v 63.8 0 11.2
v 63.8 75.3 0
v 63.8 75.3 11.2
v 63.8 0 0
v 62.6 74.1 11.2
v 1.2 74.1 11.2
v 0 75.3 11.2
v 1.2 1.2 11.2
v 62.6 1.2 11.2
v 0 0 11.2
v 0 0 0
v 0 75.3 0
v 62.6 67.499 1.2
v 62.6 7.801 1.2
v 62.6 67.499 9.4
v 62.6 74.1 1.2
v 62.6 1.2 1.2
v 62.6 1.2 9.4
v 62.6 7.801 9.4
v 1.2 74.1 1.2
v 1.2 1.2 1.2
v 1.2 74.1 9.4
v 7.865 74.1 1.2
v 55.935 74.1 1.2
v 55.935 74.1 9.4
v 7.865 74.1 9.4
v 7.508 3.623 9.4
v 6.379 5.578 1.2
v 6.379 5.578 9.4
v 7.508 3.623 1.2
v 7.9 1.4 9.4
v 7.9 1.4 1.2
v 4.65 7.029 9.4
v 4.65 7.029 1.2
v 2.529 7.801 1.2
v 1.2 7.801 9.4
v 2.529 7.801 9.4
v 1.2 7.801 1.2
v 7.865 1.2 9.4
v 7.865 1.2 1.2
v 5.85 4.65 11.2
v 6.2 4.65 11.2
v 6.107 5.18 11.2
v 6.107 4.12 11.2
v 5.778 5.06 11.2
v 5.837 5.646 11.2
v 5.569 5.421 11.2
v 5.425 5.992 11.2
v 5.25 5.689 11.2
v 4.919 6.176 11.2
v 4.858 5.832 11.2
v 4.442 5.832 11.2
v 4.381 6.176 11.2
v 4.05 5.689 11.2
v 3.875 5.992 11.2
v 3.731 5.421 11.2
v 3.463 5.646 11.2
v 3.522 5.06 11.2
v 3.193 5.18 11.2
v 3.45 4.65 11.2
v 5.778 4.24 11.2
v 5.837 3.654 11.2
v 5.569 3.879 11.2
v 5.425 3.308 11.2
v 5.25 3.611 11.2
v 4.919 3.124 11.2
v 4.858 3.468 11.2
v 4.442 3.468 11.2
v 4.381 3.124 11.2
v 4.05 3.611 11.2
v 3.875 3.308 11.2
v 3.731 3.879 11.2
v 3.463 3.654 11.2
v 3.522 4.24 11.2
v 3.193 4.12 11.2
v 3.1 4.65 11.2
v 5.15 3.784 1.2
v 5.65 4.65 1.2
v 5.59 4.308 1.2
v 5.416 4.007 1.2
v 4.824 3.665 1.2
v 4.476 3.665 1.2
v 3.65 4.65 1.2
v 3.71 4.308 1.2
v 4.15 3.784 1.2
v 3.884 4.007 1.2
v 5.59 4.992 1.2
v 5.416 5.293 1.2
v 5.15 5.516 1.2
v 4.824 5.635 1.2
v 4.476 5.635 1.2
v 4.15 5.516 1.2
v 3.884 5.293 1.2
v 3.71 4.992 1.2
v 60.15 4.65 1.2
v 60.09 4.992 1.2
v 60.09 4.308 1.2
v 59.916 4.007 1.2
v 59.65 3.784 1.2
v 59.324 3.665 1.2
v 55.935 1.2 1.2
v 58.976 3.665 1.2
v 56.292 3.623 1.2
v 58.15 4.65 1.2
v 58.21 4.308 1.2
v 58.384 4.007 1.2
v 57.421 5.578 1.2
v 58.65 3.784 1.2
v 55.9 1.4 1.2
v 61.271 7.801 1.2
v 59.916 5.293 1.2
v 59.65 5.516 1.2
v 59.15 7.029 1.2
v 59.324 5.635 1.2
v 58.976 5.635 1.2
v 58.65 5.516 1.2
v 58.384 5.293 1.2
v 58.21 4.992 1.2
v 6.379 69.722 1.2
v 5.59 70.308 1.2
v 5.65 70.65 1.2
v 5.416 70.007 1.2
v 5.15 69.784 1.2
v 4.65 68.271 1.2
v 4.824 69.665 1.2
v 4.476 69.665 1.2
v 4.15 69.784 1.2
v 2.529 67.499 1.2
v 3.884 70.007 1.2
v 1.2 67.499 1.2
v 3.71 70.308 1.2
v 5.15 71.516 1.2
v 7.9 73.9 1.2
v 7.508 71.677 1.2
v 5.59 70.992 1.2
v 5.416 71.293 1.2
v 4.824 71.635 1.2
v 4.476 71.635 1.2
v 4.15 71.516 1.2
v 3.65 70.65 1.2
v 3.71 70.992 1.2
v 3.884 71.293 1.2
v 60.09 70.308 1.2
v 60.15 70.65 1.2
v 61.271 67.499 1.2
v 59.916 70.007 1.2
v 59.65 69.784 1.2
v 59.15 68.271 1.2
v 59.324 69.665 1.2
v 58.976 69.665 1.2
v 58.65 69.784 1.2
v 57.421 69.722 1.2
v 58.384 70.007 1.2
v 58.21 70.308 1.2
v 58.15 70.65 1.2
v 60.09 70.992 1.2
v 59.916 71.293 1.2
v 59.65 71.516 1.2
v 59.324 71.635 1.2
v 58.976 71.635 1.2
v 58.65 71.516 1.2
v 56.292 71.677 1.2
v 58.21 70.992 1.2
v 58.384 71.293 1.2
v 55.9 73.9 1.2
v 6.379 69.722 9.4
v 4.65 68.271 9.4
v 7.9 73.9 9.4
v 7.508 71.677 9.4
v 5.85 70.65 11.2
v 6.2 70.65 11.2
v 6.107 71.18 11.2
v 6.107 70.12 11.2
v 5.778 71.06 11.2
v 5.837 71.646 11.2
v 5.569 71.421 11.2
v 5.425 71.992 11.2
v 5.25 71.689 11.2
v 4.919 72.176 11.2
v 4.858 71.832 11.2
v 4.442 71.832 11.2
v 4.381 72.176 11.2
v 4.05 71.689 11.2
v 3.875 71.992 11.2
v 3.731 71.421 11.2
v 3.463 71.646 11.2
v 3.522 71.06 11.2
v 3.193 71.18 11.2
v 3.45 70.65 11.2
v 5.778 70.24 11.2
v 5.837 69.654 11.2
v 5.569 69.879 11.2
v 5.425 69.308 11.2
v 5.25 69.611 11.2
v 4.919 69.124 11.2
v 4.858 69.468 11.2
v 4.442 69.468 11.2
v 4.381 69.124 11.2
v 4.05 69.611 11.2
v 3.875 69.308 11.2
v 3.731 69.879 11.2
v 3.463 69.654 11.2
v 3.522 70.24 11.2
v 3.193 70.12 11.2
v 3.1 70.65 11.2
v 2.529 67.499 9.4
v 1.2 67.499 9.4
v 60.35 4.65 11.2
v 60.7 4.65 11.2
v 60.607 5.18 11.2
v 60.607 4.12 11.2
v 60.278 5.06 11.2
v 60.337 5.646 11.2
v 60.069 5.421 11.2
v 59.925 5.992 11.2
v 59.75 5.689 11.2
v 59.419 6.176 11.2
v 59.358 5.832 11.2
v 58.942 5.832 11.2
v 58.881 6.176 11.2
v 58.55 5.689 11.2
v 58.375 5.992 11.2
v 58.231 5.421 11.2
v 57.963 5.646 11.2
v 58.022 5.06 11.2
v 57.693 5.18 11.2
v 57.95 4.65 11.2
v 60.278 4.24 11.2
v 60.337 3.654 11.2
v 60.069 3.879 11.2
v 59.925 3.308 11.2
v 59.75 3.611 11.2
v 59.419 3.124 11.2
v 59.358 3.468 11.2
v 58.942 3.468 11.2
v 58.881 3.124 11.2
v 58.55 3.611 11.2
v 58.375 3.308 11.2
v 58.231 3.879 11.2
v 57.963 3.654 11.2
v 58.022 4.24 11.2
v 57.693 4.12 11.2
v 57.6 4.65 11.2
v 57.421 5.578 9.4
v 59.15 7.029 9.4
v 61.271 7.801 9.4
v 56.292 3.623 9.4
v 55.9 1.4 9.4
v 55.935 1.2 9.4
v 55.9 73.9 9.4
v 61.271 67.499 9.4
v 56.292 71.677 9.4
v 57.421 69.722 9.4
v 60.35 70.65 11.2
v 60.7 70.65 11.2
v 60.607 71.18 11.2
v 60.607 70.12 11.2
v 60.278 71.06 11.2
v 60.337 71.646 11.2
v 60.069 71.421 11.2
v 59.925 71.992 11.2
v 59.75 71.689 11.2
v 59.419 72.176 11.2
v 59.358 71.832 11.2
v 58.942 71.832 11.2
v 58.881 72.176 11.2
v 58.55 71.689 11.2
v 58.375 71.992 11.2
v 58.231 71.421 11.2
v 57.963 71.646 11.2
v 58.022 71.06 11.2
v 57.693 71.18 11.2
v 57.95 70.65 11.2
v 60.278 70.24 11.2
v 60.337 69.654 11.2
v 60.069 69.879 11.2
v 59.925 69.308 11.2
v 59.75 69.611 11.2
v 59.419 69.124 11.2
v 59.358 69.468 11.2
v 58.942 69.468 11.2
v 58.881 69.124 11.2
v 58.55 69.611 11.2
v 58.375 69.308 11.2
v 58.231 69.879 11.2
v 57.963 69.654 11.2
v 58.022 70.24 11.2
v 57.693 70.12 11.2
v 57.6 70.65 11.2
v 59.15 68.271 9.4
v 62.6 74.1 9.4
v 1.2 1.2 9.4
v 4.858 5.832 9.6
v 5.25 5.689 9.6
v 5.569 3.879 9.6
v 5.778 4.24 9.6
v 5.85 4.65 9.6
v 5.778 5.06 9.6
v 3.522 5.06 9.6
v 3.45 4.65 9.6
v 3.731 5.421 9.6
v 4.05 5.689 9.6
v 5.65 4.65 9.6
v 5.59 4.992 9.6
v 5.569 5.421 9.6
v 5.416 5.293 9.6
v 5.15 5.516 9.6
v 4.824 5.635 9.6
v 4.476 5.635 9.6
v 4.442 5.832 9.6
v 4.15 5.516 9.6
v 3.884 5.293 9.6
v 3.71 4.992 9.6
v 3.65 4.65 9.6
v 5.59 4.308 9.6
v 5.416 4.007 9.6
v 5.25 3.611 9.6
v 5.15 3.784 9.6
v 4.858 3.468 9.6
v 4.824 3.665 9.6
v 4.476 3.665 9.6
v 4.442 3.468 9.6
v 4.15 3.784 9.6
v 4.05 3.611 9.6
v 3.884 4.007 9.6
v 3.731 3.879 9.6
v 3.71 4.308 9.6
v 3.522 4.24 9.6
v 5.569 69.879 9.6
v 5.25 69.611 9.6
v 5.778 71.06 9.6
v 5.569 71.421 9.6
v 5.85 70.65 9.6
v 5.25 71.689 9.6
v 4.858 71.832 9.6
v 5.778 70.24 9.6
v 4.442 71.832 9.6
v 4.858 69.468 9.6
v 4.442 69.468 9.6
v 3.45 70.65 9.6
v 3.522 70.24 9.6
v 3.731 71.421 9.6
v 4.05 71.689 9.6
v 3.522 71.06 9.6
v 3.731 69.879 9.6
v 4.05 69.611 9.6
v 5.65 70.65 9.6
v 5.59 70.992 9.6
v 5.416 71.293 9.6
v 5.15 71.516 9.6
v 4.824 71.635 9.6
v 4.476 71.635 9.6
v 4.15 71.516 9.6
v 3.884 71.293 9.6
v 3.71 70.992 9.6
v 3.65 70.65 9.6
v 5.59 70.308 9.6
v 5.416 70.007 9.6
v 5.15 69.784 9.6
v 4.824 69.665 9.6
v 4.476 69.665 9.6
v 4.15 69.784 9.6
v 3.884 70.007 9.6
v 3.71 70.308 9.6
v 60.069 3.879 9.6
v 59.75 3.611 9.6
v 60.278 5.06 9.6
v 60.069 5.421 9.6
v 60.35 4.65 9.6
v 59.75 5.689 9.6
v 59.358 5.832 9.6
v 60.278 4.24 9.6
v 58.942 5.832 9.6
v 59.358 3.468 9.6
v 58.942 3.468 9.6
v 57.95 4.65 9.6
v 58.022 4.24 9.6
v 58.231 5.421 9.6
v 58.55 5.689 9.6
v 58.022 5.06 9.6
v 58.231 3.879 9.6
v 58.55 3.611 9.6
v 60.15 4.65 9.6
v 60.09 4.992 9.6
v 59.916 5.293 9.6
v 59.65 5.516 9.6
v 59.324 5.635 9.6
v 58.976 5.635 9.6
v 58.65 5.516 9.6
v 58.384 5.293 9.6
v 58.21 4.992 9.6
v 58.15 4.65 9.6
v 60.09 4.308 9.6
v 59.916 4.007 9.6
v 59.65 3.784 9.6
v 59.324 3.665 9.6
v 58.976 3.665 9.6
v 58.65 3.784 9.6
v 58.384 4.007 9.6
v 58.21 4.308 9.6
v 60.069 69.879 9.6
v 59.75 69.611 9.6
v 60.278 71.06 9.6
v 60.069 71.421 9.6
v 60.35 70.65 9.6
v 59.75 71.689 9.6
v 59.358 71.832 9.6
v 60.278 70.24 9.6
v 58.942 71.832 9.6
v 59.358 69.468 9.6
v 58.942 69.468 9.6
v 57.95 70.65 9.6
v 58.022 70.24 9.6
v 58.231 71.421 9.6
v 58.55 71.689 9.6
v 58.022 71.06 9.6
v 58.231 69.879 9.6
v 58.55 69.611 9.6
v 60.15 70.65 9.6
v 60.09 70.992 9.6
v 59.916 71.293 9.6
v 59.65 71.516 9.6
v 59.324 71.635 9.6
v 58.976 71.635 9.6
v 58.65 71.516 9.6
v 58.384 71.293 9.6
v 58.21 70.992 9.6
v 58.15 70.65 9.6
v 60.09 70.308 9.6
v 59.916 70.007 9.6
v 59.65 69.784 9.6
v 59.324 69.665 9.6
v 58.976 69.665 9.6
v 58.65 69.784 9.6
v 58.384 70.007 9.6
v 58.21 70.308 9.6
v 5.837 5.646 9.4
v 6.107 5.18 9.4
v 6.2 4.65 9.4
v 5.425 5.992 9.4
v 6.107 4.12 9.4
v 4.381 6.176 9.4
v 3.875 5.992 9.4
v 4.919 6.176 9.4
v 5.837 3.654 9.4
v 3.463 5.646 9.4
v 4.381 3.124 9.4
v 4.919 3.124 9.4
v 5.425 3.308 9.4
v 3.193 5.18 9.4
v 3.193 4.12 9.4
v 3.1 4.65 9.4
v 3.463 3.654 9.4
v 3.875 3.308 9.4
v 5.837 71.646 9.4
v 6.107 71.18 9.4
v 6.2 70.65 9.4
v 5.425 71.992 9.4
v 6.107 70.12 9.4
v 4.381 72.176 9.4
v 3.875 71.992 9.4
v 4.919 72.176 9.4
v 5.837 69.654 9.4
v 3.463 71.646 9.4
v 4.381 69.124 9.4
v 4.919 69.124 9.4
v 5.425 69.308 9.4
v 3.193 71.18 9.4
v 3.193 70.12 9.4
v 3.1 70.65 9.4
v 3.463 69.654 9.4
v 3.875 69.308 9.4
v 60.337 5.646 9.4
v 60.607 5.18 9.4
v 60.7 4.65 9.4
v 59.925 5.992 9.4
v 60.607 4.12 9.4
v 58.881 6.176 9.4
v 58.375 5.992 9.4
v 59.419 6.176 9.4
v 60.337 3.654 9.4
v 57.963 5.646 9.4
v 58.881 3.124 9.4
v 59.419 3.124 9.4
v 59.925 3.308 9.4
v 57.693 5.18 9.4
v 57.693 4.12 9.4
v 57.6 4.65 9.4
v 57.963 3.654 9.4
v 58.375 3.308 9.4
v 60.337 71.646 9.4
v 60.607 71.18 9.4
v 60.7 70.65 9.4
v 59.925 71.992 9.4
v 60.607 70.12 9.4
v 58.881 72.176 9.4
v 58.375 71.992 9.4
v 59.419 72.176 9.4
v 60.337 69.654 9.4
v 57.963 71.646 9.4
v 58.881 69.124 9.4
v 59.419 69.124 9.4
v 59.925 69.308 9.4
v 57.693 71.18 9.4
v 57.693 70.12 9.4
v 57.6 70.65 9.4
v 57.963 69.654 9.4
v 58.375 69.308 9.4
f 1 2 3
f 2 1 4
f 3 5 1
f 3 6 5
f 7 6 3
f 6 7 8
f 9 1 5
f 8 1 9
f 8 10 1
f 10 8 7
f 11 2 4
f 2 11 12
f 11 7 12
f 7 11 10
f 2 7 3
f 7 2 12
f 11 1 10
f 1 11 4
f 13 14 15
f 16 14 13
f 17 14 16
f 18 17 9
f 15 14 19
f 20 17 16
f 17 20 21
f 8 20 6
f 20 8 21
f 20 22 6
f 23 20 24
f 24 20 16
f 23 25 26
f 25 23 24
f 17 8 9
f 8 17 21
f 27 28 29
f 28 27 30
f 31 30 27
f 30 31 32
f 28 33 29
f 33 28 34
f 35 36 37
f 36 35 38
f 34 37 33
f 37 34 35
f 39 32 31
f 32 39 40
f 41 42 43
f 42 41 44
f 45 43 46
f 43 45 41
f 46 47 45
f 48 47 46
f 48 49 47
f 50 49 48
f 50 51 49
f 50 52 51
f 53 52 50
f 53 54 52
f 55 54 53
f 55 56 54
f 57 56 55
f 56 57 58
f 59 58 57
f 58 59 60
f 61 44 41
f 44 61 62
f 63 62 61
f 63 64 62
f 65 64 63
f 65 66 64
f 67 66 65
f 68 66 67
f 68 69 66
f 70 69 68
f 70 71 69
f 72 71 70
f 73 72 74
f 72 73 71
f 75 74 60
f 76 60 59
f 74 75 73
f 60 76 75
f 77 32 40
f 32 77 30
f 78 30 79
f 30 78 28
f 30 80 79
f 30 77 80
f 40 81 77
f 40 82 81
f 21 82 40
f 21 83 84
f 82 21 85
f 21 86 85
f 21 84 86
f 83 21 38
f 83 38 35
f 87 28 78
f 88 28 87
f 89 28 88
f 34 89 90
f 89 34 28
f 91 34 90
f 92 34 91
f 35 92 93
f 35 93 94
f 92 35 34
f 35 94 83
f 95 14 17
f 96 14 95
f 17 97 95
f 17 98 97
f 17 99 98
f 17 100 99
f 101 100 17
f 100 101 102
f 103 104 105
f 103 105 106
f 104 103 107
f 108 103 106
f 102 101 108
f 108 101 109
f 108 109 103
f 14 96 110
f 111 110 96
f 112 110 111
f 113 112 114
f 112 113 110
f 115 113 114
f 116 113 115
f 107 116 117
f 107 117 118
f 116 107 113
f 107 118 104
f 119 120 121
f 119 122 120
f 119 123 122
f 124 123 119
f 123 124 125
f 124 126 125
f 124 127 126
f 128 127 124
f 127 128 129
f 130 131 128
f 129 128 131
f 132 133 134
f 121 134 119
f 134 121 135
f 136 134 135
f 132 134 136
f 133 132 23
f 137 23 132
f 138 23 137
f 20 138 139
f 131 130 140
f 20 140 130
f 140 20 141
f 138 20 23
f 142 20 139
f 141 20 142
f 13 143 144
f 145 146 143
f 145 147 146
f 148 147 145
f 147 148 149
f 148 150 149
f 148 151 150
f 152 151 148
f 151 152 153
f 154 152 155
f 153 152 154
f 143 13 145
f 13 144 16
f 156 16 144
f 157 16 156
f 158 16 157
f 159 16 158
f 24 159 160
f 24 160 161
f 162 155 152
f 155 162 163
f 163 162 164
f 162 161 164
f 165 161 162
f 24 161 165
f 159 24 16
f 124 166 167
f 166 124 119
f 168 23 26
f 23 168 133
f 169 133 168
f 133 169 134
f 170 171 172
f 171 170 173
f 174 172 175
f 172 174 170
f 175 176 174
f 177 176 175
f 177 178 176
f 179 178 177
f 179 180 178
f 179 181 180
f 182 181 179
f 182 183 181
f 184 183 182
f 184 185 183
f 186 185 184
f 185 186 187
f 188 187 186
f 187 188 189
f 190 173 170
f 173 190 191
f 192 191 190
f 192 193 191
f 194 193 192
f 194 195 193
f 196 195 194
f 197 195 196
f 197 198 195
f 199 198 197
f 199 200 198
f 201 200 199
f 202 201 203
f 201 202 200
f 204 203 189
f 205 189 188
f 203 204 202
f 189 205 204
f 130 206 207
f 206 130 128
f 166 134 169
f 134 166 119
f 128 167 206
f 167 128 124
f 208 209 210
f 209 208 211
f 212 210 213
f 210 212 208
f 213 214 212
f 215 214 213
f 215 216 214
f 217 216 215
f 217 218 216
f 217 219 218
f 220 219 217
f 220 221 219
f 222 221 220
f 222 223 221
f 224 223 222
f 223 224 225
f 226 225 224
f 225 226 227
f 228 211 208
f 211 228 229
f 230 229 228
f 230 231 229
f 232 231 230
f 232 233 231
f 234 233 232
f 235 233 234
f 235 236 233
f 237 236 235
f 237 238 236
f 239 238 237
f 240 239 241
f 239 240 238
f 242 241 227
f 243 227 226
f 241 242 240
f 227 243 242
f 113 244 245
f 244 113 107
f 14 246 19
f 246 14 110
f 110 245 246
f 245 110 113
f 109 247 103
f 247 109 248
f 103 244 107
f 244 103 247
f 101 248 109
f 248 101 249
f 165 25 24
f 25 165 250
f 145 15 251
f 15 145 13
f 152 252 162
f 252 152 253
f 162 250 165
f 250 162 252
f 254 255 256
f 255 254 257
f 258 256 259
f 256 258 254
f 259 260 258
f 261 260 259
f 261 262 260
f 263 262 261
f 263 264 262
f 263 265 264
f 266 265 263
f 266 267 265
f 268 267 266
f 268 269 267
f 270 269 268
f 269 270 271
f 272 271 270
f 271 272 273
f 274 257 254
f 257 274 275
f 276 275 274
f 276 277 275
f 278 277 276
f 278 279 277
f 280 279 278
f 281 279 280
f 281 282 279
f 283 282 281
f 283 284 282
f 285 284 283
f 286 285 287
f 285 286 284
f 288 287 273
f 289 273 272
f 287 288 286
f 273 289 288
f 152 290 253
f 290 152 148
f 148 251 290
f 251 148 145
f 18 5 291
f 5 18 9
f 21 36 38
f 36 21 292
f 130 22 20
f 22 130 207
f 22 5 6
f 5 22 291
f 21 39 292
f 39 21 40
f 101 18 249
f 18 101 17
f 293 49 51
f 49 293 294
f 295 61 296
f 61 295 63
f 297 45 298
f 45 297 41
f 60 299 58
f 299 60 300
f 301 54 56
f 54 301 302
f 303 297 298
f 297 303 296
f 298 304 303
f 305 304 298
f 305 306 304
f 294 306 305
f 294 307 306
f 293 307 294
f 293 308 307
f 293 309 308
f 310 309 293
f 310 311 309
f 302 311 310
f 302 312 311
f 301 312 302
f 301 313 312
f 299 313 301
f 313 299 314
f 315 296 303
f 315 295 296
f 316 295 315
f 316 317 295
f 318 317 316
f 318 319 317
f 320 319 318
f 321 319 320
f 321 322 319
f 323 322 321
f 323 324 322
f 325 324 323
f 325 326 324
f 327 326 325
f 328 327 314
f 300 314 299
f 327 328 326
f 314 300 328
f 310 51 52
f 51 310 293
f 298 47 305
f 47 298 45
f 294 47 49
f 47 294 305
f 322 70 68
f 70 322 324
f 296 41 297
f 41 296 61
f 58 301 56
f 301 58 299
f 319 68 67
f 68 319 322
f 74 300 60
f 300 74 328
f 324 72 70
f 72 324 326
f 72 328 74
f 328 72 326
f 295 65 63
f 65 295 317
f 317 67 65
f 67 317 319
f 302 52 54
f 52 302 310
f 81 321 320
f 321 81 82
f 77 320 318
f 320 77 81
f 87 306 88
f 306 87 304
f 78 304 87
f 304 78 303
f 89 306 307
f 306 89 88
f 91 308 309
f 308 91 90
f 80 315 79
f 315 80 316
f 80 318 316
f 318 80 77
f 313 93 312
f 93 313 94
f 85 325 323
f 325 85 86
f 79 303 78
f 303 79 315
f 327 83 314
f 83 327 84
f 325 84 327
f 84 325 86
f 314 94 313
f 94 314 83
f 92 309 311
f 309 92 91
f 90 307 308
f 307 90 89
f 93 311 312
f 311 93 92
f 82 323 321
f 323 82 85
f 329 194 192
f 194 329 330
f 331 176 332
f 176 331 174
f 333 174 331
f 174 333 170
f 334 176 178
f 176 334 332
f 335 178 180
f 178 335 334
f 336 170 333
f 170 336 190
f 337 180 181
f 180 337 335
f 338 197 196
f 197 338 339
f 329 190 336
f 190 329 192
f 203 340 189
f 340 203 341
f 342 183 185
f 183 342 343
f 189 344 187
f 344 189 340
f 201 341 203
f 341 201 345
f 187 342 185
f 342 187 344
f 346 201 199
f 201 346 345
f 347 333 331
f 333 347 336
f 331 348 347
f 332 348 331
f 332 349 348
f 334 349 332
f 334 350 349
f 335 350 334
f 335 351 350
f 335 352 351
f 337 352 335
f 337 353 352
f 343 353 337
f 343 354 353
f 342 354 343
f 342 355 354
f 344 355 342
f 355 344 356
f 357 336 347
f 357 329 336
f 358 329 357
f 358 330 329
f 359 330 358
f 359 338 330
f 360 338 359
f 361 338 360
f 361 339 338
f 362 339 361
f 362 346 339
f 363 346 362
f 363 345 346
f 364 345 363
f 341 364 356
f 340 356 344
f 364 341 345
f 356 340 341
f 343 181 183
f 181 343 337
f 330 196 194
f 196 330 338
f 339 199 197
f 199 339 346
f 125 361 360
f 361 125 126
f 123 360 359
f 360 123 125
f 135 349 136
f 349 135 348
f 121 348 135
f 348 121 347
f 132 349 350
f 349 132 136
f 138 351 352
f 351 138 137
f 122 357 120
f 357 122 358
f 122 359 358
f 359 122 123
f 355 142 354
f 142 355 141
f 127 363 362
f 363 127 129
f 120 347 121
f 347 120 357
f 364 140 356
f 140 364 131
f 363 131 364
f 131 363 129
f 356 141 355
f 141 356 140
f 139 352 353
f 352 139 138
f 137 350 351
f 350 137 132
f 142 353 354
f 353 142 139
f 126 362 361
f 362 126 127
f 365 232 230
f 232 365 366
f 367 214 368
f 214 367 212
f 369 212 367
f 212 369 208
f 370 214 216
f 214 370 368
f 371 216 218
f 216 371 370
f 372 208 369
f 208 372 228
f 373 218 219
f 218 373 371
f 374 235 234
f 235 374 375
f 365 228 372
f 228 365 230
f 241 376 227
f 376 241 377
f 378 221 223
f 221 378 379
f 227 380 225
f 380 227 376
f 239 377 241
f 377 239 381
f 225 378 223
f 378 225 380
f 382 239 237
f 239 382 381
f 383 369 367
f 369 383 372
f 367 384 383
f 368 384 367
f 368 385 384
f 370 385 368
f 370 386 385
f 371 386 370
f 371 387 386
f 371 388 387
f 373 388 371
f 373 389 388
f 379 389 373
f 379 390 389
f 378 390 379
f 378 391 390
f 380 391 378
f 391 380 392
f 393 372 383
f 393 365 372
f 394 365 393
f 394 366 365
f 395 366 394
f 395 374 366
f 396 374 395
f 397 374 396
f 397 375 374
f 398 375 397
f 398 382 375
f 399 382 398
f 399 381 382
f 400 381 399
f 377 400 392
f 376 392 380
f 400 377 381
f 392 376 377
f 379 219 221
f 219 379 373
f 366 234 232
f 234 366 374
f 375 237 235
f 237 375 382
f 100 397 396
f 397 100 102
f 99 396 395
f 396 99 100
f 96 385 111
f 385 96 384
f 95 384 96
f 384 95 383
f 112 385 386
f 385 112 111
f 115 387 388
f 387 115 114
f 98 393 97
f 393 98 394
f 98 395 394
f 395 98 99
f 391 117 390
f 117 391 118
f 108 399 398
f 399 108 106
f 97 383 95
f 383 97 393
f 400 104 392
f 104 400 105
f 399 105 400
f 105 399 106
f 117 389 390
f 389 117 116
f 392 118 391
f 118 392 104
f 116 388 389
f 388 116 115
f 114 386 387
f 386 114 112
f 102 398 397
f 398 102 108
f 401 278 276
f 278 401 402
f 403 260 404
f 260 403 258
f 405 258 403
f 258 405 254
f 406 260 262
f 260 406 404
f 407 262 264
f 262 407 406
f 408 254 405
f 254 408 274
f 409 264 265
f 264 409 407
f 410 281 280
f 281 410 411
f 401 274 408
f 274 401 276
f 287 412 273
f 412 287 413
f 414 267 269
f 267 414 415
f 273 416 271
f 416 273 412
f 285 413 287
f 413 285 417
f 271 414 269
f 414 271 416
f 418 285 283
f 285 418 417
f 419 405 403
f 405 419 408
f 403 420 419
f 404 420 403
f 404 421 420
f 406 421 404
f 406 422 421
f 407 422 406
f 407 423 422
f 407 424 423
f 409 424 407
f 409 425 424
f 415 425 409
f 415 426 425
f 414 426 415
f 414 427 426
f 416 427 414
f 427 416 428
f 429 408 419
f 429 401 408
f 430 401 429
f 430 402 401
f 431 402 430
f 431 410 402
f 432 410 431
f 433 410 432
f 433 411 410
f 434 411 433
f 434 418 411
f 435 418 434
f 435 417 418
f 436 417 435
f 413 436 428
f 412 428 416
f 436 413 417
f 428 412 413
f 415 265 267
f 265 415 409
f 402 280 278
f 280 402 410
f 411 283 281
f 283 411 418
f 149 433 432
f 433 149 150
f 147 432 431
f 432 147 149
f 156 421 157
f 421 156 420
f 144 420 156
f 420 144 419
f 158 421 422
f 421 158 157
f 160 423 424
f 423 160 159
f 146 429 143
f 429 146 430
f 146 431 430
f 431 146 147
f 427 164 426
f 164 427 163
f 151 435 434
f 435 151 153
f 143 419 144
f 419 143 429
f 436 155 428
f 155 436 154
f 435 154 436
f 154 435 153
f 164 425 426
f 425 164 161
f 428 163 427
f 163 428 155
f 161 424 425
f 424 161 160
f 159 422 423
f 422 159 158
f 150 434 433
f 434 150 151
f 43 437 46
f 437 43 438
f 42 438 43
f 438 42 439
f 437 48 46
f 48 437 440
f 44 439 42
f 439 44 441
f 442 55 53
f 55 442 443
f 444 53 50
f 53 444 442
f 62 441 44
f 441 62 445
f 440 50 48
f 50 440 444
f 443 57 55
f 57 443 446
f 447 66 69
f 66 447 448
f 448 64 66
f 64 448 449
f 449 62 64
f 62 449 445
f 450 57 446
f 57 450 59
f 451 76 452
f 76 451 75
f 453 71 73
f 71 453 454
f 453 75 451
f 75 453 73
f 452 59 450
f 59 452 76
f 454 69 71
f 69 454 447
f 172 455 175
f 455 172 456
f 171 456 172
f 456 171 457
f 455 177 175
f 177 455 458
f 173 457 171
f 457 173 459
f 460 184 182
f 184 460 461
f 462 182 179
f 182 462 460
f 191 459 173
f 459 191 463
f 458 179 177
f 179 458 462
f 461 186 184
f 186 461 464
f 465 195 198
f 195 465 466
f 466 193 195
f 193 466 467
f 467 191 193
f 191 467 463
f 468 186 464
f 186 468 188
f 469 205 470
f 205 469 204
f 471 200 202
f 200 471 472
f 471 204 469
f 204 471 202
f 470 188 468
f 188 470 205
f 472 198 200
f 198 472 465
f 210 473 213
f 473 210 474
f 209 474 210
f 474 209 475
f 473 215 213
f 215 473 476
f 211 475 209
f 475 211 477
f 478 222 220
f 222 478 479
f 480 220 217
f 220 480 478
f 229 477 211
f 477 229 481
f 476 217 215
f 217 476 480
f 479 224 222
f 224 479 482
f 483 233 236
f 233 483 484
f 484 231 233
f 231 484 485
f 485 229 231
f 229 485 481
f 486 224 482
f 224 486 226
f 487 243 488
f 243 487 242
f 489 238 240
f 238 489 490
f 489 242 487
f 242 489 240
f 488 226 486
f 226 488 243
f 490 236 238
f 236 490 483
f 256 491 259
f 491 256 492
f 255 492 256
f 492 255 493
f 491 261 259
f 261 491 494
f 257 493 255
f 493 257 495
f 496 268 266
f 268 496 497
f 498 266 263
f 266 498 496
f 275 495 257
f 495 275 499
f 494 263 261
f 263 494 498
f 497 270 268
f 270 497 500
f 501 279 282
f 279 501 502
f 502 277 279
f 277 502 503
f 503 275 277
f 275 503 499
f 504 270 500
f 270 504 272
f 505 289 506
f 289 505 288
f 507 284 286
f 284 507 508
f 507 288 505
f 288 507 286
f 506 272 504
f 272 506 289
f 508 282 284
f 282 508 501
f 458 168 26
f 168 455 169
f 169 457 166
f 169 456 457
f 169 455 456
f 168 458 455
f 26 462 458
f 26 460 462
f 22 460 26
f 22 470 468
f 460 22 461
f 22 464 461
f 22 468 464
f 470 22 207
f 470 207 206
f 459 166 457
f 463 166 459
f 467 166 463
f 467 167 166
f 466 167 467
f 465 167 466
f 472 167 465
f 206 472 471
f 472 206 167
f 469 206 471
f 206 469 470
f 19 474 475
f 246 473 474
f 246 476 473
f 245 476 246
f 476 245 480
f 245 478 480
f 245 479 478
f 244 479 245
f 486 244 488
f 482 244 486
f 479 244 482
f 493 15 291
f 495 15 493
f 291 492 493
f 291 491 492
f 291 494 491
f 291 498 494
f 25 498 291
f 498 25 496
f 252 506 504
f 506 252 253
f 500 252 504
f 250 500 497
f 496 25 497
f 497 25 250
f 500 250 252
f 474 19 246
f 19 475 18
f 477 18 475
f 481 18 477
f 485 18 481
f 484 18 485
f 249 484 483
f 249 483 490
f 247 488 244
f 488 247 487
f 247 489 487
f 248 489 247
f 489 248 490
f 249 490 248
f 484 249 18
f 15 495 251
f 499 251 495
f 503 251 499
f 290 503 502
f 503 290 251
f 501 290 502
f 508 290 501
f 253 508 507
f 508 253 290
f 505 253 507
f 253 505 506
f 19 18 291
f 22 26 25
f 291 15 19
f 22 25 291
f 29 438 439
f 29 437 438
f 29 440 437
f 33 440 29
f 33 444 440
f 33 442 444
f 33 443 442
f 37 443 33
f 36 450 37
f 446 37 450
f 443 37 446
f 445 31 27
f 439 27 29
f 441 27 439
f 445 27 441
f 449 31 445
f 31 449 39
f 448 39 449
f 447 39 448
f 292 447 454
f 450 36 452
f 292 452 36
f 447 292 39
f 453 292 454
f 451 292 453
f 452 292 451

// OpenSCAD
clearance = 0.2;
cap_clearance = 0.3;
t = 0.01;
$fn = 18;
wall = 1.2;

pcb_w = 61;
pcb_d = 72.5;
pcb_h = 1.6;
height = 10 + wall;

module edgk_35() {
    wire_w = 0.8;
    wire_h = 3.5;
    wire_d = 3.5; // distance between legs
    w = 7.8;
    d = 7.2;
    color("#8D8")
    cube([w, d, 9.2]);
    for (x = [w/2 - wire_d/2, w/2 + wire_d/2]) {
        color("silver")
        translate([x - wire_w/2, 2.9, -wire_h])
        cube([wire_w, wire_w, wire_h]);
    }
}

module pcb(positive, real) {
    c = (real)? 0: clearance;
    w = pcb_w;
    d = pcb_d;
    h = pcb_h;
    screw_hole_from_edge = 1.5;
    screw_hole_d = 3.5;
    screw_hole_pos = screw_hole_from_edge + screw_hole_d/2;
    screw_h = 10;
    if (positive) {
        hole_size = screw_hole_d + screw_hole_from_edge*2;
        color("blue")
        difference() {
            intersection() {
                for (x = [0, w], y = [0, d]) {
                    translate([x, y, -height+wall])
                    cylinder(r = hole_size, h = height-wall);
                    //cube([hole_size, hole_size, height-wall + t*2]);
                }
                translate([-clearance, -clearance, -height+wall])
                cube([w+clearance*2, d+clearance*2, height]);
            }
            // screw holes
            for (x = [screw_hole_pos, w - screw_hole_pos], y = [screw_hole_pos, d - screw_hole_pos]) {
                translate([x, y, -h])
                cylinder(d = 2.4 + c*2, h = h + t*2+c*2);
                translate([x, y, - screw_h])
                cylinder(d = 2, h = screw_h);
            }
        }
    } else {
        translate([0, 0, -h])
        difference() {
            color("orange")
            translate([-c, -c, -c])
            cube([w+c*2, d+c*2, h+c*2]);
            // screw holes
            for (x = [screw_hole_pos, w - screw_hole_pos], y = [screw_hole_pos, d - screw_hole_pos]) {
                translate([x, y, -t-c])
                cylinder(d = screw_hole_d - c*2, h = h + t*2+c*2);
            }
        }
        // dc in
        translate([1.7, 65, 0])
        rotate(90, [0, 0, -1])
        edgk_35();
        // big cap
        color("#333")
        translate([29.8, 55, 0])
        cylinder(d = 8.1, h = 13);
        // big inductor
        color("#333")
        translate([53.6, 24.6, 0])
        cylinder(d = 9.7, h = 14);
        // spacing for bottom smd parts and tht legs
        smd_h = 2.4 + c;
        smd_padding = 0.8;
        color([1, 1, 1, 0.5])
        translate([0, 0, -h - smd_h])
        difference() {
            cube([pcb_w - smd_padding*2, pcb_d - smd_padding*2, smd_h]);
            hole_size = screw_hole_d + screw_hole_from_edge*2;
            for (x = [screw_hole_pos, w - screw_hole_pos], y = [screw_hole_pos, d - screw_hole_pos]) {
                translate([x - hole_size/2, y - hole_size/2, -t])
                cube([hole_size, hole_size, smd_h + t*2]);
            }
        }
    }
}

module upper_casing(positive, real) {
    c = (real)? 0: cap_clearance;
    if (positive) {
    } else {
    }
}

module lower_casing(positive, real) {
    c = (real)? 0: clearance;
    w = pcb_w + clearance*2 + wall*2;
    d = pcb_d + clearance*2 + wall*2;
    h = height;
    pcb_pos = [wall + clearance, wall + clearance, h];
    cap_pos = [0, 0, h];
    cavity_margin = wall + 5;
    if (positive) {
    } else {
        difference() {
            union() {
                color("#555")
                difference() {
                    cube([w, d, h]);
                    // cavity
                    translate([wall+c, wall+c, wall+c])
                    cube([w - wall*2 -c*2, d - wall*2 - c*2, h - wall + t]);
                }
                translate(cap_pos)
                upper_casing(true, true);
                translate(pcb_pos)
                pcb(true, true);
            }
            /*translate([cavity_margin, cavity_margin, wall])
            cube([w - cavity_margin*2, d - cavity_margin*2, h - wall + t]);*/
            translate(cap_pos)
            upper_casing(false, false);
            // pcb imprint
            translate(pcb_pos)
            pcb(false, false);
        }
        *translate(pcb_pos)
        pcb(false, true);
    }
}

lower_casing(false, true);
